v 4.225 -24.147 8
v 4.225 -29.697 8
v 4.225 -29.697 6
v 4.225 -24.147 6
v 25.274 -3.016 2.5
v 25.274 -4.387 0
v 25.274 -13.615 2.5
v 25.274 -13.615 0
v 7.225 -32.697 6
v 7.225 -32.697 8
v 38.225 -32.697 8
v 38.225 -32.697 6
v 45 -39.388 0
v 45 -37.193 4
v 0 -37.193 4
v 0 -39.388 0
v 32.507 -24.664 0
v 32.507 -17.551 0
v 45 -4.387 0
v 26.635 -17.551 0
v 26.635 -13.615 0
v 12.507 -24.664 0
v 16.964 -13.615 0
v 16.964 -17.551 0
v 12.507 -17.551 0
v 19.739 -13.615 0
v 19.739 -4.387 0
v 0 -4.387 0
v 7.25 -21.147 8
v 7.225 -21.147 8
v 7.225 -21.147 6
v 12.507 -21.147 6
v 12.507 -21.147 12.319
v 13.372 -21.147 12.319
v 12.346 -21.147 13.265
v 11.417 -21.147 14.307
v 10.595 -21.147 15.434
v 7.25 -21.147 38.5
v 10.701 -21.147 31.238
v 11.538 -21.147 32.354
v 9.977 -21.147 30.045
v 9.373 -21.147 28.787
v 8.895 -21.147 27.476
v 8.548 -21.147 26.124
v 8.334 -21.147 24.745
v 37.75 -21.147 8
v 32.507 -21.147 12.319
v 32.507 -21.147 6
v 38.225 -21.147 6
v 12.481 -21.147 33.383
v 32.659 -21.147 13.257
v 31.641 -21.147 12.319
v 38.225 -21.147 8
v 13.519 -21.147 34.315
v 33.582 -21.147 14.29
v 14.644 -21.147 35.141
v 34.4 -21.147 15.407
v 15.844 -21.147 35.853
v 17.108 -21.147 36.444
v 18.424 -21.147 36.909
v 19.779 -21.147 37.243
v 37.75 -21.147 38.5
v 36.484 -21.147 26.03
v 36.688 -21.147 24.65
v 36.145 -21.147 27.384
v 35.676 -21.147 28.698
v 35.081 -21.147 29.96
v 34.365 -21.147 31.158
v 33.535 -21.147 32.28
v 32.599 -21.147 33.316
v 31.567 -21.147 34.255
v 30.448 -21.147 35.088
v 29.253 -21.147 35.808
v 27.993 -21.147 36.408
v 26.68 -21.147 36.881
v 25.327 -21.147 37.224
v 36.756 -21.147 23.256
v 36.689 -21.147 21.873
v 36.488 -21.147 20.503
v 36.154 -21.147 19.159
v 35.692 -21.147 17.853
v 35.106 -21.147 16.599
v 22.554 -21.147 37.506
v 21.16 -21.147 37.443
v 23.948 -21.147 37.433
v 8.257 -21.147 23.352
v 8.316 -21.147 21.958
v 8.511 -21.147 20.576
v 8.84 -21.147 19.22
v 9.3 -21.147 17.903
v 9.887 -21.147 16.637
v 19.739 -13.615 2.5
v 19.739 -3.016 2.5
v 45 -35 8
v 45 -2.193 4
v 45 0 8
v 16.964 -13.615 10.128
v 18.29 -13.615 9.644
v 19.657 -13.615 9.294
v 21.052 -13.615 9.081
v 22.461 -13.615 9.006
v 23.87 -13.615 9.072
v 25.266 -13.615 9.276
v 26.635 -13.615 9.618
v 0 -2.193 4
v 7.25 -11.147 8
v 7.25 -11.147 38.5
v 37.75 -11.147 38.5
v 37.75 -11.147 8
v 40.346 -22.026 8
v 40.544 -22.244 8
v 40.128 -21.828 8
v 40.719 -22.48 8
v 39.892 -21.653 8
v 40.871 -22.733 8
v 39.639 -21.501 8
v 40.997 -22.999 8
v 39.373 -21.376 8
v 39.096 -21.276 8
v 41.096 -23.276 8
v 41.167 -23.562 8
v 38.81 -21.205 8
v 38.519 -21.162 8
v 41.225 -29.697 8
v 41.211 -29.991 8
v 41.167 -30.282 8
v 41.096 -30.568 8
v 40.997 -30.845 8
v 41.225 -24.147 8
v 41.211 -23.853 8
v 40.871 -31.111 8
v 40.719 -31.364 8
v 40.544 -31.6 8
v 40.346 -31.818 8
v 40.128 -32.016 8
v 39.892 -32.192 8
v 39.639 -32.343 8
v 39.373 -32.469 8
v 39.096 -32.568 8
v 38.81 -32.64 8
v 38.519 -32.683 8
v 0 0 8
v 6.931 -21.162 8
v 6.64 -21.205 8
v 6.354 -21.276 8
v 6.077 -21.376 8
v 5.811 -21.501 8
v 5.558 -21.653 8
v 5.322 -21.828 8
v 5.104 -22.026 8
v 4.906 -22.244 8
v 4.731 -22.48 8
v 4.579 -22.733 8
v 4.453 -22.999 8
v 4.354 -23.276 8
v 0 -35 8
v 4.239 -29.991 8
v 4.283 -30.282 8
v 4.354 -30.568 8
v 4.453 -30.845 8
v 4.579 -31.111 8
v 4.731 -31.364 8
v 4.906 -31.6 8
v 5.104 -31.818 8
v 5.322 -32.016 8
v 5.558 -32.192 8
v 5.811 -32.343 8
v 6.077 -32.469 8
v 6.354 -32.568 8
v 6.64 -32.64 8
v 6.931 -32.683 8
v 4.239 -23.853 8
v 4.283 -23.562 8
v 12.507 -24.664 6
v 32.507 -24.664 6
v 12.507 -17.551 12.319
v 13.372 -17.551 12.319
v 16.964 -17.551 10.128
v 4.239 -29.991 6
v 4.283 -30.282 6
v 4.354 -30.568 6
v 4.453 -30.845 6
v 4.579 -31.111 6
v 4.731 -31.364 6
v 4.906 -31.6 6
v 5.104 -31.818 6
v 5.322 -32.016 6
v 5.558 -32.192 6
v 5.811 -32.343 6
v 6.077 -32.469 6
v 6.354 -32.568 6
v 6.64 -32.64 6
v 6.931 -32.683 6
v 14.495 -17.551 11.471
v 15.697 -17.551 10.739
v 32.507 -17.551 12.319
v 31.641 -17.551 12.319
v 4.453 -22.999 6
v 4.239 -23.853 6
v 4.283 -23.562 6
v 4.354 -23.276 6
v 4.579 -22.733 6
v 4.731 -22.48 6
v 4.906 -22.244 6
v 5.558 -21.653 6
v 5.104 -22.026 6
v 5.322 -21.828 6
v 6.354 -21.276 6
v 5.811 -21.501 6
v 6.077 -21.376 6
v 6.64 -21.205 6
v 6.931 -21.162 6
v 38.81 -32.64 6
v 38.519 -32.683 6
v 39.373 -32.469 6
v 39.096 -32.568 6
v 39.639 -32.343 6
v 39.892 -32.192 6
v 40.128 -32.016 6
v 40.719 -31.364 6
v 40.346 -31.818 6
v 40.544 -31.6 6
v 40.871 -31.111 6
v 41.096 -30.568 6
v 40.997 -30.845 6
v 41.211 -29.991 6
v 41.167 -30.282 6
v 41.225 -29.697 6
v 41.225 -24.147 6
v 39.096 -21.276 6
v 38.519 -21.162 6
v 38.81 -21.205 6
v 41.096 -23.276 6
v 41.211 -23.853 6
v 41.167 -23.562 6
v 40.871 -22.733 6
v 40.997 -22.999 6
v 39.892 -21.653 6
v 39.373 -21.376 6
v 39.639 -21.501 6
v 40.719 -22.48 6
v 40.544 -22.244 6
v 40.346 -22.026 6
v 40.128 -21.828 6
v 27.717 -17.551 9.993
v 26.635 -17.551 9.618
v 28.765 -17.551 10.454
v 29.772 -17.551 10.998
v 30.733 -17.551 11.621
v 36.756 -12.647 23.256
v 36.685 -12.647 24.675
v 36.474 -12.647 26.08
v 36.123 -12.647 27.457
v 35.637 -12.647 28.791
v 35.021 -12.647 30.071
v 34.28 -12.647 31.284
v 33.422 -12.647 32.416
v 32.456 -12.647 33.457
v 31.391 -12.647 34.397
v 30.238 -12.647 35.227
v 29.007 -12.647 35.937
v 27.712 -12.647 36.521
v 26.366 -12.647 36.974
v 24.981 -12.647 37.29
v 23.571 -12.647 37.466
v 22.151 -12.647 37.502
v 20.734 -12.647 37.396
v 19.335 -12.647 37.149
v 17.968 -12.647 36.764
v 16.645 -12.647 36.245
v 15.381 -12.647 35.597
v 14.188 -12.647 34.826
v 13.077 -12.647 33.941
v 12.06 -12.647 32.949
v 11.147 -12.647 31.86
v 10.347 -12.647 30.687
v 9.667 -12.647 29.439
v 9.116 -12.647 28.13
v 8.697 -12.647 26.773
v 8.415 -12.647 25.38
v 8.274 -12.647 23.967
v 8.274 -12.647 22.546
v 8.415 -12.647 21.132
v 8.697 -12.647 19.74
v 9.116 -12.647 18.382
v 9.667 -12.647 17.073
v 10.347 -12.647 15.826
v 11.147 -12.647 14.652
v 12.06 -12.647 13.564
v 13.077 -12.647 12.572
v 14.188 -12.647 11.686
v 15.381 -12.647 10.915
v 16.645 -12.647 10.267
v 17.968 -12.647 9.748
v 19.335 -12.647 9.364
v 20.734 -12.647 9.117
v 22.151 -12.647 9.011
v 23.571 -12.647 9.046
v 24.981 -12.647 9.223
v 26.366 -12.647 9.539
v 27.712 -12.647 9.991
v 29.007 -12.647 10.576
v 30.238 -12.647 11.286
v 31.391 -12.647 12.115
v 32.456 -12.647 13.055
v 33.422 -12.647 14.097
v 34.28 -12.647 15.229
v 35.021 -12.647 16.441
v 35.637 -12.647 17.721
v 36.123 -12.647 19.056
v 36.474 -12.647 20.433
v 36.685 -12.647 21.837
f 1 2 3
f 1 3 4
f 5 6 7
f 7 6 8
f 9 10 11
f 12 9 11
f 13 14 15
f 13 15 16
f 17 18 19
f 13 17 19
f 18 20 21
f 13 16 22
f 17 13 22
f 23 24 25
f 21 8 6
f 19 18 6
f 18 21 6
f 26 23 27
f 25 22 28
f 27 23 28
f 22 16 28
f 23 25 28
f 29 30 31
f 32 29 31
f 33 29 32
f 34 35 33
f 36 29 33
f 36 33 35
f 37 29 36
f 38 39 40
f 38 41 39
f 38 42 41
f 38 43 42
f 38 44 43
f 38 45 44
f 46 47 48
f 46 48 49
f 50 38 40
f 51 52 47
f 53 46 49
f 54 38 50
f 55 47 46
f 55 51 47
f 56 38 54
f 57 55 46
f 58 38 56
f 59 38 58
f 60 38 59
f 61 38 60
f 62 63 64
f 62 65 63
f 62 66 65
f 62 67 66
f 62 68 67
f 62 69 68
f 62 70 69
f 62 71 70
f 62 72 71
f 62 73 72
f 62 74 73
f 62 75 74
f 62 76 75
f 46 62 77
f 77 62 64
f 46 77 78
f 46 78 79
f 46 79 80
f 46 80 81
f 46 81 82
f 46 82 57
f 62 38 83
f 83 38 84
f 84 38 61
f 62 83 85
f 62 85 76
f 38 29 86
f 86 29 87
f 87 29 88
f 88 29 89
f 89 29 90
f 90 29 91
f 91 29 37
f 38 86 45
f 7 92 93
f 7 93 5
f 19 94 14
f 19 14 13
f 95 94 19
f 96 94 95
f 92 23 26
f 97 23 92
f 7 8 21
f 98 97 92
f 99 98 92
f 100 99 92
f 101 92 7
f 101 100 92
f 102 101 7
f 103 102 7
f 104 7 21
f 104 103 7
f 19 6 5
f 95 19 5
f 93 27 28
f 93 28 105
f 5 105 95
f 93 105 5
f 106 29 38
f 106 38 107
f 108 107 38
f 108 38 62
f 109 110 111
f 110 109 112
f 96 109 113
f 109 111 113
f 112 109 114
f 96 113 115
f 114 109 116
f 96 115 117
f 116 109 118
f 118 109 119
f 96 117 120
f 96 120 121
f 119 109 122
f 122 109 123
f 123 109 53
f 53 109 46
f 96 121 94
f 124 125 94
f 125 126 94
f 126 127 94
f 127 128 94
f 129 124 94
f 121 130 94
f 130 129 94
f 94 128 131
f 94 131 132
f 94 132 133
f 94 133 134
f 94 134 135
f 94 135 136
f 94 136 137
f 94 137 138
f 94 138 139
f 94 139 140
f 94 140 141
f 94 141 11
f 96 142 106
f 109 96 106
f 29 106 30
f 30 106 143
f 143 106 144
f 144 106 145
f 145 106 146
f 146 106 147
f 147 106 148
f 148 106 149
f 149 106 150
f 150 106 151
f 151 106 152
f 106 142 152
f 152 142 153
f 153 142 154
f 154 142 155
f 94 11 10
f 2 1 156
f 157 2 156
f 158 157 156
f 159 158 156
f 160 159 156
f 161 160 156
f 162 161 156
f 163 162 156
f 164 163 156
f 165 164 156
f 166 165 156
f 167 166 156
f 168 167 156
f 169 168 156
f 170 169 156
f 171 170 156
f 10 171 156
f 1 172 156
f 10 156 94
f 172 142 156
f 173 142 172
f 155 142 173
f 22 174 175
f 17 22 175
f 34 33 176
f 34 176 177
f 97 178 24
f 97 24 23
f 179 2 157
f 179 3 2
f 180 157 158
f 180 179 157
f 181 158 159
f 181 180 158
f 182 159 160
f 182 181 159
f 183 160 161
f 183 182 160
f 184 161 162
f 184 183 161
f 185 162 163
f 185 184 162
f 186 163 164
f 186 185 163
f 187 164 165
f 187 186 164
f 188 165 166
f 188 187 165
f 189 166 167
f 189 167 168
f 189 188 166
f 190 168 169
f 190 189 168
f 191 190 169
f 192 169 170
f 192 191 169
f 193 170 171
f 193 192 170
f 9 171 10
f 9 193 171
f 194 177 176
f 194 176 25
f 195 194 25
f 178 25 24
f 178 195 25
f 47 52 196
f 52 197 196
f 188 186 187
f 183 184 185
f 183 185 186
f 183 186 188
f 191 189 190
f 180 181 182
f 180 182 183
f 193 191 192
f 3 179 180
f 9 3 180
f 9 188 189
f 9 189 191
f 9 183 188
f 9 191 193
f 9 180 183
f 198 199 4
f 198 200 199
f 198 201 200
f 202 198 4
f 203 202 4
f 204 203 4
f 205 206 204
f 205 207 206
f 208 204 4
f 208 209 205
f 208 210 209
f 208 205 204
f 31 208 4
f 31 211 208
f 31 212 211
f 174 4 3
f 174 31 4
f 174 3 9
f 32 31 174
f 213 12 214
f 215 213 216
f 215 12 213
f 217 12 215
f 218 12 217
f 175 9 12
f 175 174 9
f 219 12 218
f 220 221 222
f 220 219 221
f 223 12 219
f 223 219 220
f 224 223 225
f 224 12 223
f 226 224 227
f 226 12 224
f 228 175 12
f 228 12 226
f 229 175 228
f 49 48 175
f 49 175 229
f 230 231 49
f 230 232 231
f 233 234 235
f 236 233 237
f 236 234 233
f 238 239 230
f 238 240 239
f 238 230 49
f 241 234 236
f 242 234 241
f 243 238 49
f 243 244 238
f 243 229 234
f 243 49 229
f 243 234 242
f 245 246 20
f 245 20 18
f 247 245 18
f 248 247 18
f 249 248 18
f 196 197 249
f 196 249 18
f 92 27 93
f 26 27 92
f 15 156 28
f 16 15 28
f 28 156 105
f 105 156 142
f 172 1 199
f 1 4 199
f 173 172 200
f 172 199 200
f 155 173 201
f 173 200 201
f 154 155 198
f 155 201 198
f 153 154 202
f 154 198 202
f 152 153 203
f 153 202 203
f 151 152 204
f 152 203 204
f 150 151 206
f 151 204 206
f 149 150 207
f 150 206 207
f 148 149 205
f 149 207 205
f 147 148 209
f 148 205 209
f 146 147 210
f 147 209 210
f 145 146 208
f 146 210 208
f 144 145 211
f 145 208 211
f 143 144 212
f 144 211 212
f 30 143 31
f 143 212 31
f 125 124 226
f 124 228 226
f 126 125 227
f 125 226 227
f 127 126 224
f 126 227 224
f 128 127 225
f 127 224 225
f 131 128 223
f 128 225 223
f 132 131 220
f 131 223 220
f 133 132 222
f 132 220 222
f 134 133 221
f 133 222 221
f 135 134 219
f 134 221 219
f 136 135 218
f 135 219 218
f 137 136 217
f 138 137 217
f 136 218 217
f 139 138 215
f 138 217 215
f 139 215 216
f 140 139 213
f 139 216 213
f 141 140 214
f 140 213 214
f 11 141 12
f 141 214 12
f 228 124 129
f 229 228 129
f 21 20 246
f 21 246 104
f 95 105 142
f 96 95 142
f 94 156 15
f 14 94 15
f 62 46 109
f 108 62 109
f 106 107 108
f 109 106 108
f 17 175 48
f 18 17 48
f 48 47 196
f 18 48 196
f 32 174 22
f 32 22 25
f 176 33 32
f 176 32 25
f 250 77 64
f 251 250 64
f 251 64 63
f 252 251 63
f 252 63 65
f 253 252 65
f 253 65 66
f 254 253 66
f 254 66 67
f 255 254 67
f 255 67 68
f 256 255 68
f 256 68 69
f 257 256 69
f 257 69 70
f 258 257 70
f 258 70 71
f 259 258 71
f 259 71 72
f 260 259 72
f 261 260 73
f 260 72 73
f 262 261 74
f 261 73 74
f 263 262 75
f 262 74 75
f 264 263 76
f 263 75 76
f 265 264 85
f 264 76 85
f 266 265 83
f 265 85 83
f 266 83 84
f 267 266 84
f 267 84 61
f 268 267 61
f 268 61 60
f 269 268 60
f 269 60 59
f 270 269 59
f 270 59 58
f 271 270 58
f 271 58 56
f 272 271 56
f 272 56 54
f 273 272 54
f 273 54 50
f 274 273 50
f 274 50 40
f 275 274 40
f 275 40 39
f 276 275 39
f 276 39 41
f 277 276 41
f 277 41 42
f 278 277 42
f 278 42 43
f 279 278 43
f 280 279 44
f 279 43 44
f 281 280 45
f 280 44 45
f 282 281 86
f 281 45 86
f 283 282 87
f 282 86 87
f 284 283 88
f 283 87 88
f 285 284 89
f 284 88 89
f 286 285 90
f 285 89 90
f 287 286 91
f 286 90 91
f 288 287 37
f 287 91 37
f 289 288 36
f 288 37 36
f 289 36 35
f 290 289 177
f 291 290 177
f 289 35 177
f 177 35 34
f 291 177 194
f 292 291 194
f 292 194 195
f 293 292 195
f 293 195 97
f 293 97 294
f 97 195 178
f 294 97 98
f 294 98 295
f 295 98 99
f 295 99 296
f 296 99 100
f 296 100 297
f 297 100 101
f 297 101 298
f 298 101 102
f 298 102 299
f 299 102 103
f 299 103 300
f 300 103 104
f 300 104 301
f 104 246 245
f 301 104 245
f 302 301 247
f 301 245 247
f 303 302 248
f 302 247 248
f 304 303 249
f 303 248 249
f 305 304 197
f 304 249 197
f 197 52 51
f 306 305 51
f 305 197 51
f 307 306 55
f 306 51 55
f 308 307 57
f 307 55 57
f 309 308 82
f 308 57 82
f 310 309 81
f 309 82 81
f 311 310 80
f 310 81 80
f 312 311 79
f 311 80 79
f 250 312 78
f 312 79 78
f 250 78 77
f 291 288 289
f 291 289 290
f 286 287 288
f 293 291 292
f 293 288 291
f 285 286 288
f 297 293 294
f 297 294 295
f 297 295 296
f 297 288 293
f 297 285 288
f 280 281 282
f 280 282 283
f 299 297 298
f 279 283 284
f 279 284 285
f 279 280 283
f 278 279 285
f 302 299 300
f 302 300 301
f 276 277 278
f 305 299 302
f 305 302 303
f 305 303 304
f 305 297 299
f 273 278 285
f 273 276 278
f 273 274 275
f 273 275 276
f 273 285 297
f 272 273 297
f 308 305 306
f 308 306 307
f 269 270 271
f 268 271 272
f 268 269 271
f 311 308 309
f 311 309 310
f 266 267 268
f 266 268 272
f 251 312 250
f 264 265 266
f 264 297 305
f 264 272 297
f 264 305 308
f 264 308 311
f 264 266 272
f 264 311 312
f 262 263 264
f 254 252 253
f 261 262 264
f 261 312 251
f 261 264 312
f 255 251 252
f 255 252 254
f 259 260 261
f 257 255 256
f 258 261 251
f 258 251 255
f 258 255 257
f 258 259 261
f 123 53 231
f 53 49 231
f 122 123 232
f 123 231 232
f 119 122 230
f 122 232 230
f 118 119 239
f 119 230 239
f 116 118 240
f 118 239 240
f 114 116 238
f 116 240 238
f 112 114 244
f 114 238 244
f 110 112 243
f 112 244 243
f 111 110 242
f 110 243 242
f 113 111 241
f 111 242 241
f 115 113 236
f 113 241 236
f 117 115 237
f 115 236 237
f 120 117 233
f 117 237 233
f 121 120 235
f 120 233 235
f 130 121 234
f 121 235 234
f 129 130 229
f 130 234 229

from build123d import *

# Parameters (mm, degrees)
F1_DEPTH  = 45
F2_W      = 37
F2_H      = 11.55
F3_DEPTH  = 2
F4_R      = 3
F5_W      = 30.5
F5_H      = 10
F6_DEPTH  = 30.5
F7_R      = 14.25
F8_DEPTH  = 8.5
F10_W     = 20
F10_H     = 7.113087
F11_DEPTH = 25.4
F12_W     = 5.534876
F12_H     = 25.616745
F13_DEPTH = 2.5
F14_W     = 9.670809
F14_H     = 9.330716
F15_DEPTH = 25.4


with BuildPart() as f1:
    # F0 (on Right) → F1 (new body)
    with BuildSketch(Plane.YZ):
        Polygon((-35, 8), (-37.193318, 4), (-39.387777, 0), (-4.386635, 0), (-2.193318, 4), (0, 8), align=None)
    extrude(amount=F1_DEPTH)

    # F2 (on face) → F3 (cut)
    with BuildSketch(Plane.XY.offset(8)):
        with Locations((22.725, -26.922163)):
            Rectangle(F2_W, F2_H)
    extrude(amount=-F3_DEPTH, mode=Mode.SUBTRACT)

    # F4
    f4_edges = [f1.edges().sort_by_distance(p)[0] for p in [
        (4.225, -21.147163, 7),
        (4.225, -32.697163, 7),
        (41.225, -21.147163, 7),
        (41.225, -32.697163, 7),
    ]]
    fillet(f4_edges, radius=F4_R)

    # F5 (on face) → F6 (join)
    with BuildSketch(Plane.XY.offset(8)):
        with Locations((22.5, -16.147163)):
            Rectangle(F5_W, F5_H)
    extrude(amount=F6_DEPTH)

    # F7 (on face) → F8 (cut)
    with BuildSketch(Plane.XZ.offset(21.147163)):
        with Locations((22.506247, 23.256247)):
            Circle(F7_R)
    extrude(amount=-F8_DEPTH, mode=Mode.SUBTRACT)

    # F10 (on offset) → F11 (cut)
    with BuildSketch(Plane.XY.offset(12.319)):
        with Locations((22.506516, -21.107878)):
            Rectangle(F10_W, F10_H)
    extrude(amount=-F11_DEPTH, mode=Mode.SUBTRACT)

    # F12 (on face) → F13 (cut)
    with BuildSketch(Plane(origin=(0, 0, 0), x_dir=(1, 0, 0), z_dir=(0, 0, -1))):
        with Locations((22.506516, 4.771188)):
            Rectangle(F12_W, F12_H)
    extrude(amount=-F13_DEPTH, mode=Mode.SUBTRACT)

    # F14 (on offset) → F15 (cut)
    with BuildSketch(Plane.XY.offset(12.319)):
        with Locations((21.799793, -18.280461)):
            Rectangle(F14_W, F14_H)
    extrude(amount=-F15_DEPTH, mode=Mode.SUBTRACT)


solid = f1.part
